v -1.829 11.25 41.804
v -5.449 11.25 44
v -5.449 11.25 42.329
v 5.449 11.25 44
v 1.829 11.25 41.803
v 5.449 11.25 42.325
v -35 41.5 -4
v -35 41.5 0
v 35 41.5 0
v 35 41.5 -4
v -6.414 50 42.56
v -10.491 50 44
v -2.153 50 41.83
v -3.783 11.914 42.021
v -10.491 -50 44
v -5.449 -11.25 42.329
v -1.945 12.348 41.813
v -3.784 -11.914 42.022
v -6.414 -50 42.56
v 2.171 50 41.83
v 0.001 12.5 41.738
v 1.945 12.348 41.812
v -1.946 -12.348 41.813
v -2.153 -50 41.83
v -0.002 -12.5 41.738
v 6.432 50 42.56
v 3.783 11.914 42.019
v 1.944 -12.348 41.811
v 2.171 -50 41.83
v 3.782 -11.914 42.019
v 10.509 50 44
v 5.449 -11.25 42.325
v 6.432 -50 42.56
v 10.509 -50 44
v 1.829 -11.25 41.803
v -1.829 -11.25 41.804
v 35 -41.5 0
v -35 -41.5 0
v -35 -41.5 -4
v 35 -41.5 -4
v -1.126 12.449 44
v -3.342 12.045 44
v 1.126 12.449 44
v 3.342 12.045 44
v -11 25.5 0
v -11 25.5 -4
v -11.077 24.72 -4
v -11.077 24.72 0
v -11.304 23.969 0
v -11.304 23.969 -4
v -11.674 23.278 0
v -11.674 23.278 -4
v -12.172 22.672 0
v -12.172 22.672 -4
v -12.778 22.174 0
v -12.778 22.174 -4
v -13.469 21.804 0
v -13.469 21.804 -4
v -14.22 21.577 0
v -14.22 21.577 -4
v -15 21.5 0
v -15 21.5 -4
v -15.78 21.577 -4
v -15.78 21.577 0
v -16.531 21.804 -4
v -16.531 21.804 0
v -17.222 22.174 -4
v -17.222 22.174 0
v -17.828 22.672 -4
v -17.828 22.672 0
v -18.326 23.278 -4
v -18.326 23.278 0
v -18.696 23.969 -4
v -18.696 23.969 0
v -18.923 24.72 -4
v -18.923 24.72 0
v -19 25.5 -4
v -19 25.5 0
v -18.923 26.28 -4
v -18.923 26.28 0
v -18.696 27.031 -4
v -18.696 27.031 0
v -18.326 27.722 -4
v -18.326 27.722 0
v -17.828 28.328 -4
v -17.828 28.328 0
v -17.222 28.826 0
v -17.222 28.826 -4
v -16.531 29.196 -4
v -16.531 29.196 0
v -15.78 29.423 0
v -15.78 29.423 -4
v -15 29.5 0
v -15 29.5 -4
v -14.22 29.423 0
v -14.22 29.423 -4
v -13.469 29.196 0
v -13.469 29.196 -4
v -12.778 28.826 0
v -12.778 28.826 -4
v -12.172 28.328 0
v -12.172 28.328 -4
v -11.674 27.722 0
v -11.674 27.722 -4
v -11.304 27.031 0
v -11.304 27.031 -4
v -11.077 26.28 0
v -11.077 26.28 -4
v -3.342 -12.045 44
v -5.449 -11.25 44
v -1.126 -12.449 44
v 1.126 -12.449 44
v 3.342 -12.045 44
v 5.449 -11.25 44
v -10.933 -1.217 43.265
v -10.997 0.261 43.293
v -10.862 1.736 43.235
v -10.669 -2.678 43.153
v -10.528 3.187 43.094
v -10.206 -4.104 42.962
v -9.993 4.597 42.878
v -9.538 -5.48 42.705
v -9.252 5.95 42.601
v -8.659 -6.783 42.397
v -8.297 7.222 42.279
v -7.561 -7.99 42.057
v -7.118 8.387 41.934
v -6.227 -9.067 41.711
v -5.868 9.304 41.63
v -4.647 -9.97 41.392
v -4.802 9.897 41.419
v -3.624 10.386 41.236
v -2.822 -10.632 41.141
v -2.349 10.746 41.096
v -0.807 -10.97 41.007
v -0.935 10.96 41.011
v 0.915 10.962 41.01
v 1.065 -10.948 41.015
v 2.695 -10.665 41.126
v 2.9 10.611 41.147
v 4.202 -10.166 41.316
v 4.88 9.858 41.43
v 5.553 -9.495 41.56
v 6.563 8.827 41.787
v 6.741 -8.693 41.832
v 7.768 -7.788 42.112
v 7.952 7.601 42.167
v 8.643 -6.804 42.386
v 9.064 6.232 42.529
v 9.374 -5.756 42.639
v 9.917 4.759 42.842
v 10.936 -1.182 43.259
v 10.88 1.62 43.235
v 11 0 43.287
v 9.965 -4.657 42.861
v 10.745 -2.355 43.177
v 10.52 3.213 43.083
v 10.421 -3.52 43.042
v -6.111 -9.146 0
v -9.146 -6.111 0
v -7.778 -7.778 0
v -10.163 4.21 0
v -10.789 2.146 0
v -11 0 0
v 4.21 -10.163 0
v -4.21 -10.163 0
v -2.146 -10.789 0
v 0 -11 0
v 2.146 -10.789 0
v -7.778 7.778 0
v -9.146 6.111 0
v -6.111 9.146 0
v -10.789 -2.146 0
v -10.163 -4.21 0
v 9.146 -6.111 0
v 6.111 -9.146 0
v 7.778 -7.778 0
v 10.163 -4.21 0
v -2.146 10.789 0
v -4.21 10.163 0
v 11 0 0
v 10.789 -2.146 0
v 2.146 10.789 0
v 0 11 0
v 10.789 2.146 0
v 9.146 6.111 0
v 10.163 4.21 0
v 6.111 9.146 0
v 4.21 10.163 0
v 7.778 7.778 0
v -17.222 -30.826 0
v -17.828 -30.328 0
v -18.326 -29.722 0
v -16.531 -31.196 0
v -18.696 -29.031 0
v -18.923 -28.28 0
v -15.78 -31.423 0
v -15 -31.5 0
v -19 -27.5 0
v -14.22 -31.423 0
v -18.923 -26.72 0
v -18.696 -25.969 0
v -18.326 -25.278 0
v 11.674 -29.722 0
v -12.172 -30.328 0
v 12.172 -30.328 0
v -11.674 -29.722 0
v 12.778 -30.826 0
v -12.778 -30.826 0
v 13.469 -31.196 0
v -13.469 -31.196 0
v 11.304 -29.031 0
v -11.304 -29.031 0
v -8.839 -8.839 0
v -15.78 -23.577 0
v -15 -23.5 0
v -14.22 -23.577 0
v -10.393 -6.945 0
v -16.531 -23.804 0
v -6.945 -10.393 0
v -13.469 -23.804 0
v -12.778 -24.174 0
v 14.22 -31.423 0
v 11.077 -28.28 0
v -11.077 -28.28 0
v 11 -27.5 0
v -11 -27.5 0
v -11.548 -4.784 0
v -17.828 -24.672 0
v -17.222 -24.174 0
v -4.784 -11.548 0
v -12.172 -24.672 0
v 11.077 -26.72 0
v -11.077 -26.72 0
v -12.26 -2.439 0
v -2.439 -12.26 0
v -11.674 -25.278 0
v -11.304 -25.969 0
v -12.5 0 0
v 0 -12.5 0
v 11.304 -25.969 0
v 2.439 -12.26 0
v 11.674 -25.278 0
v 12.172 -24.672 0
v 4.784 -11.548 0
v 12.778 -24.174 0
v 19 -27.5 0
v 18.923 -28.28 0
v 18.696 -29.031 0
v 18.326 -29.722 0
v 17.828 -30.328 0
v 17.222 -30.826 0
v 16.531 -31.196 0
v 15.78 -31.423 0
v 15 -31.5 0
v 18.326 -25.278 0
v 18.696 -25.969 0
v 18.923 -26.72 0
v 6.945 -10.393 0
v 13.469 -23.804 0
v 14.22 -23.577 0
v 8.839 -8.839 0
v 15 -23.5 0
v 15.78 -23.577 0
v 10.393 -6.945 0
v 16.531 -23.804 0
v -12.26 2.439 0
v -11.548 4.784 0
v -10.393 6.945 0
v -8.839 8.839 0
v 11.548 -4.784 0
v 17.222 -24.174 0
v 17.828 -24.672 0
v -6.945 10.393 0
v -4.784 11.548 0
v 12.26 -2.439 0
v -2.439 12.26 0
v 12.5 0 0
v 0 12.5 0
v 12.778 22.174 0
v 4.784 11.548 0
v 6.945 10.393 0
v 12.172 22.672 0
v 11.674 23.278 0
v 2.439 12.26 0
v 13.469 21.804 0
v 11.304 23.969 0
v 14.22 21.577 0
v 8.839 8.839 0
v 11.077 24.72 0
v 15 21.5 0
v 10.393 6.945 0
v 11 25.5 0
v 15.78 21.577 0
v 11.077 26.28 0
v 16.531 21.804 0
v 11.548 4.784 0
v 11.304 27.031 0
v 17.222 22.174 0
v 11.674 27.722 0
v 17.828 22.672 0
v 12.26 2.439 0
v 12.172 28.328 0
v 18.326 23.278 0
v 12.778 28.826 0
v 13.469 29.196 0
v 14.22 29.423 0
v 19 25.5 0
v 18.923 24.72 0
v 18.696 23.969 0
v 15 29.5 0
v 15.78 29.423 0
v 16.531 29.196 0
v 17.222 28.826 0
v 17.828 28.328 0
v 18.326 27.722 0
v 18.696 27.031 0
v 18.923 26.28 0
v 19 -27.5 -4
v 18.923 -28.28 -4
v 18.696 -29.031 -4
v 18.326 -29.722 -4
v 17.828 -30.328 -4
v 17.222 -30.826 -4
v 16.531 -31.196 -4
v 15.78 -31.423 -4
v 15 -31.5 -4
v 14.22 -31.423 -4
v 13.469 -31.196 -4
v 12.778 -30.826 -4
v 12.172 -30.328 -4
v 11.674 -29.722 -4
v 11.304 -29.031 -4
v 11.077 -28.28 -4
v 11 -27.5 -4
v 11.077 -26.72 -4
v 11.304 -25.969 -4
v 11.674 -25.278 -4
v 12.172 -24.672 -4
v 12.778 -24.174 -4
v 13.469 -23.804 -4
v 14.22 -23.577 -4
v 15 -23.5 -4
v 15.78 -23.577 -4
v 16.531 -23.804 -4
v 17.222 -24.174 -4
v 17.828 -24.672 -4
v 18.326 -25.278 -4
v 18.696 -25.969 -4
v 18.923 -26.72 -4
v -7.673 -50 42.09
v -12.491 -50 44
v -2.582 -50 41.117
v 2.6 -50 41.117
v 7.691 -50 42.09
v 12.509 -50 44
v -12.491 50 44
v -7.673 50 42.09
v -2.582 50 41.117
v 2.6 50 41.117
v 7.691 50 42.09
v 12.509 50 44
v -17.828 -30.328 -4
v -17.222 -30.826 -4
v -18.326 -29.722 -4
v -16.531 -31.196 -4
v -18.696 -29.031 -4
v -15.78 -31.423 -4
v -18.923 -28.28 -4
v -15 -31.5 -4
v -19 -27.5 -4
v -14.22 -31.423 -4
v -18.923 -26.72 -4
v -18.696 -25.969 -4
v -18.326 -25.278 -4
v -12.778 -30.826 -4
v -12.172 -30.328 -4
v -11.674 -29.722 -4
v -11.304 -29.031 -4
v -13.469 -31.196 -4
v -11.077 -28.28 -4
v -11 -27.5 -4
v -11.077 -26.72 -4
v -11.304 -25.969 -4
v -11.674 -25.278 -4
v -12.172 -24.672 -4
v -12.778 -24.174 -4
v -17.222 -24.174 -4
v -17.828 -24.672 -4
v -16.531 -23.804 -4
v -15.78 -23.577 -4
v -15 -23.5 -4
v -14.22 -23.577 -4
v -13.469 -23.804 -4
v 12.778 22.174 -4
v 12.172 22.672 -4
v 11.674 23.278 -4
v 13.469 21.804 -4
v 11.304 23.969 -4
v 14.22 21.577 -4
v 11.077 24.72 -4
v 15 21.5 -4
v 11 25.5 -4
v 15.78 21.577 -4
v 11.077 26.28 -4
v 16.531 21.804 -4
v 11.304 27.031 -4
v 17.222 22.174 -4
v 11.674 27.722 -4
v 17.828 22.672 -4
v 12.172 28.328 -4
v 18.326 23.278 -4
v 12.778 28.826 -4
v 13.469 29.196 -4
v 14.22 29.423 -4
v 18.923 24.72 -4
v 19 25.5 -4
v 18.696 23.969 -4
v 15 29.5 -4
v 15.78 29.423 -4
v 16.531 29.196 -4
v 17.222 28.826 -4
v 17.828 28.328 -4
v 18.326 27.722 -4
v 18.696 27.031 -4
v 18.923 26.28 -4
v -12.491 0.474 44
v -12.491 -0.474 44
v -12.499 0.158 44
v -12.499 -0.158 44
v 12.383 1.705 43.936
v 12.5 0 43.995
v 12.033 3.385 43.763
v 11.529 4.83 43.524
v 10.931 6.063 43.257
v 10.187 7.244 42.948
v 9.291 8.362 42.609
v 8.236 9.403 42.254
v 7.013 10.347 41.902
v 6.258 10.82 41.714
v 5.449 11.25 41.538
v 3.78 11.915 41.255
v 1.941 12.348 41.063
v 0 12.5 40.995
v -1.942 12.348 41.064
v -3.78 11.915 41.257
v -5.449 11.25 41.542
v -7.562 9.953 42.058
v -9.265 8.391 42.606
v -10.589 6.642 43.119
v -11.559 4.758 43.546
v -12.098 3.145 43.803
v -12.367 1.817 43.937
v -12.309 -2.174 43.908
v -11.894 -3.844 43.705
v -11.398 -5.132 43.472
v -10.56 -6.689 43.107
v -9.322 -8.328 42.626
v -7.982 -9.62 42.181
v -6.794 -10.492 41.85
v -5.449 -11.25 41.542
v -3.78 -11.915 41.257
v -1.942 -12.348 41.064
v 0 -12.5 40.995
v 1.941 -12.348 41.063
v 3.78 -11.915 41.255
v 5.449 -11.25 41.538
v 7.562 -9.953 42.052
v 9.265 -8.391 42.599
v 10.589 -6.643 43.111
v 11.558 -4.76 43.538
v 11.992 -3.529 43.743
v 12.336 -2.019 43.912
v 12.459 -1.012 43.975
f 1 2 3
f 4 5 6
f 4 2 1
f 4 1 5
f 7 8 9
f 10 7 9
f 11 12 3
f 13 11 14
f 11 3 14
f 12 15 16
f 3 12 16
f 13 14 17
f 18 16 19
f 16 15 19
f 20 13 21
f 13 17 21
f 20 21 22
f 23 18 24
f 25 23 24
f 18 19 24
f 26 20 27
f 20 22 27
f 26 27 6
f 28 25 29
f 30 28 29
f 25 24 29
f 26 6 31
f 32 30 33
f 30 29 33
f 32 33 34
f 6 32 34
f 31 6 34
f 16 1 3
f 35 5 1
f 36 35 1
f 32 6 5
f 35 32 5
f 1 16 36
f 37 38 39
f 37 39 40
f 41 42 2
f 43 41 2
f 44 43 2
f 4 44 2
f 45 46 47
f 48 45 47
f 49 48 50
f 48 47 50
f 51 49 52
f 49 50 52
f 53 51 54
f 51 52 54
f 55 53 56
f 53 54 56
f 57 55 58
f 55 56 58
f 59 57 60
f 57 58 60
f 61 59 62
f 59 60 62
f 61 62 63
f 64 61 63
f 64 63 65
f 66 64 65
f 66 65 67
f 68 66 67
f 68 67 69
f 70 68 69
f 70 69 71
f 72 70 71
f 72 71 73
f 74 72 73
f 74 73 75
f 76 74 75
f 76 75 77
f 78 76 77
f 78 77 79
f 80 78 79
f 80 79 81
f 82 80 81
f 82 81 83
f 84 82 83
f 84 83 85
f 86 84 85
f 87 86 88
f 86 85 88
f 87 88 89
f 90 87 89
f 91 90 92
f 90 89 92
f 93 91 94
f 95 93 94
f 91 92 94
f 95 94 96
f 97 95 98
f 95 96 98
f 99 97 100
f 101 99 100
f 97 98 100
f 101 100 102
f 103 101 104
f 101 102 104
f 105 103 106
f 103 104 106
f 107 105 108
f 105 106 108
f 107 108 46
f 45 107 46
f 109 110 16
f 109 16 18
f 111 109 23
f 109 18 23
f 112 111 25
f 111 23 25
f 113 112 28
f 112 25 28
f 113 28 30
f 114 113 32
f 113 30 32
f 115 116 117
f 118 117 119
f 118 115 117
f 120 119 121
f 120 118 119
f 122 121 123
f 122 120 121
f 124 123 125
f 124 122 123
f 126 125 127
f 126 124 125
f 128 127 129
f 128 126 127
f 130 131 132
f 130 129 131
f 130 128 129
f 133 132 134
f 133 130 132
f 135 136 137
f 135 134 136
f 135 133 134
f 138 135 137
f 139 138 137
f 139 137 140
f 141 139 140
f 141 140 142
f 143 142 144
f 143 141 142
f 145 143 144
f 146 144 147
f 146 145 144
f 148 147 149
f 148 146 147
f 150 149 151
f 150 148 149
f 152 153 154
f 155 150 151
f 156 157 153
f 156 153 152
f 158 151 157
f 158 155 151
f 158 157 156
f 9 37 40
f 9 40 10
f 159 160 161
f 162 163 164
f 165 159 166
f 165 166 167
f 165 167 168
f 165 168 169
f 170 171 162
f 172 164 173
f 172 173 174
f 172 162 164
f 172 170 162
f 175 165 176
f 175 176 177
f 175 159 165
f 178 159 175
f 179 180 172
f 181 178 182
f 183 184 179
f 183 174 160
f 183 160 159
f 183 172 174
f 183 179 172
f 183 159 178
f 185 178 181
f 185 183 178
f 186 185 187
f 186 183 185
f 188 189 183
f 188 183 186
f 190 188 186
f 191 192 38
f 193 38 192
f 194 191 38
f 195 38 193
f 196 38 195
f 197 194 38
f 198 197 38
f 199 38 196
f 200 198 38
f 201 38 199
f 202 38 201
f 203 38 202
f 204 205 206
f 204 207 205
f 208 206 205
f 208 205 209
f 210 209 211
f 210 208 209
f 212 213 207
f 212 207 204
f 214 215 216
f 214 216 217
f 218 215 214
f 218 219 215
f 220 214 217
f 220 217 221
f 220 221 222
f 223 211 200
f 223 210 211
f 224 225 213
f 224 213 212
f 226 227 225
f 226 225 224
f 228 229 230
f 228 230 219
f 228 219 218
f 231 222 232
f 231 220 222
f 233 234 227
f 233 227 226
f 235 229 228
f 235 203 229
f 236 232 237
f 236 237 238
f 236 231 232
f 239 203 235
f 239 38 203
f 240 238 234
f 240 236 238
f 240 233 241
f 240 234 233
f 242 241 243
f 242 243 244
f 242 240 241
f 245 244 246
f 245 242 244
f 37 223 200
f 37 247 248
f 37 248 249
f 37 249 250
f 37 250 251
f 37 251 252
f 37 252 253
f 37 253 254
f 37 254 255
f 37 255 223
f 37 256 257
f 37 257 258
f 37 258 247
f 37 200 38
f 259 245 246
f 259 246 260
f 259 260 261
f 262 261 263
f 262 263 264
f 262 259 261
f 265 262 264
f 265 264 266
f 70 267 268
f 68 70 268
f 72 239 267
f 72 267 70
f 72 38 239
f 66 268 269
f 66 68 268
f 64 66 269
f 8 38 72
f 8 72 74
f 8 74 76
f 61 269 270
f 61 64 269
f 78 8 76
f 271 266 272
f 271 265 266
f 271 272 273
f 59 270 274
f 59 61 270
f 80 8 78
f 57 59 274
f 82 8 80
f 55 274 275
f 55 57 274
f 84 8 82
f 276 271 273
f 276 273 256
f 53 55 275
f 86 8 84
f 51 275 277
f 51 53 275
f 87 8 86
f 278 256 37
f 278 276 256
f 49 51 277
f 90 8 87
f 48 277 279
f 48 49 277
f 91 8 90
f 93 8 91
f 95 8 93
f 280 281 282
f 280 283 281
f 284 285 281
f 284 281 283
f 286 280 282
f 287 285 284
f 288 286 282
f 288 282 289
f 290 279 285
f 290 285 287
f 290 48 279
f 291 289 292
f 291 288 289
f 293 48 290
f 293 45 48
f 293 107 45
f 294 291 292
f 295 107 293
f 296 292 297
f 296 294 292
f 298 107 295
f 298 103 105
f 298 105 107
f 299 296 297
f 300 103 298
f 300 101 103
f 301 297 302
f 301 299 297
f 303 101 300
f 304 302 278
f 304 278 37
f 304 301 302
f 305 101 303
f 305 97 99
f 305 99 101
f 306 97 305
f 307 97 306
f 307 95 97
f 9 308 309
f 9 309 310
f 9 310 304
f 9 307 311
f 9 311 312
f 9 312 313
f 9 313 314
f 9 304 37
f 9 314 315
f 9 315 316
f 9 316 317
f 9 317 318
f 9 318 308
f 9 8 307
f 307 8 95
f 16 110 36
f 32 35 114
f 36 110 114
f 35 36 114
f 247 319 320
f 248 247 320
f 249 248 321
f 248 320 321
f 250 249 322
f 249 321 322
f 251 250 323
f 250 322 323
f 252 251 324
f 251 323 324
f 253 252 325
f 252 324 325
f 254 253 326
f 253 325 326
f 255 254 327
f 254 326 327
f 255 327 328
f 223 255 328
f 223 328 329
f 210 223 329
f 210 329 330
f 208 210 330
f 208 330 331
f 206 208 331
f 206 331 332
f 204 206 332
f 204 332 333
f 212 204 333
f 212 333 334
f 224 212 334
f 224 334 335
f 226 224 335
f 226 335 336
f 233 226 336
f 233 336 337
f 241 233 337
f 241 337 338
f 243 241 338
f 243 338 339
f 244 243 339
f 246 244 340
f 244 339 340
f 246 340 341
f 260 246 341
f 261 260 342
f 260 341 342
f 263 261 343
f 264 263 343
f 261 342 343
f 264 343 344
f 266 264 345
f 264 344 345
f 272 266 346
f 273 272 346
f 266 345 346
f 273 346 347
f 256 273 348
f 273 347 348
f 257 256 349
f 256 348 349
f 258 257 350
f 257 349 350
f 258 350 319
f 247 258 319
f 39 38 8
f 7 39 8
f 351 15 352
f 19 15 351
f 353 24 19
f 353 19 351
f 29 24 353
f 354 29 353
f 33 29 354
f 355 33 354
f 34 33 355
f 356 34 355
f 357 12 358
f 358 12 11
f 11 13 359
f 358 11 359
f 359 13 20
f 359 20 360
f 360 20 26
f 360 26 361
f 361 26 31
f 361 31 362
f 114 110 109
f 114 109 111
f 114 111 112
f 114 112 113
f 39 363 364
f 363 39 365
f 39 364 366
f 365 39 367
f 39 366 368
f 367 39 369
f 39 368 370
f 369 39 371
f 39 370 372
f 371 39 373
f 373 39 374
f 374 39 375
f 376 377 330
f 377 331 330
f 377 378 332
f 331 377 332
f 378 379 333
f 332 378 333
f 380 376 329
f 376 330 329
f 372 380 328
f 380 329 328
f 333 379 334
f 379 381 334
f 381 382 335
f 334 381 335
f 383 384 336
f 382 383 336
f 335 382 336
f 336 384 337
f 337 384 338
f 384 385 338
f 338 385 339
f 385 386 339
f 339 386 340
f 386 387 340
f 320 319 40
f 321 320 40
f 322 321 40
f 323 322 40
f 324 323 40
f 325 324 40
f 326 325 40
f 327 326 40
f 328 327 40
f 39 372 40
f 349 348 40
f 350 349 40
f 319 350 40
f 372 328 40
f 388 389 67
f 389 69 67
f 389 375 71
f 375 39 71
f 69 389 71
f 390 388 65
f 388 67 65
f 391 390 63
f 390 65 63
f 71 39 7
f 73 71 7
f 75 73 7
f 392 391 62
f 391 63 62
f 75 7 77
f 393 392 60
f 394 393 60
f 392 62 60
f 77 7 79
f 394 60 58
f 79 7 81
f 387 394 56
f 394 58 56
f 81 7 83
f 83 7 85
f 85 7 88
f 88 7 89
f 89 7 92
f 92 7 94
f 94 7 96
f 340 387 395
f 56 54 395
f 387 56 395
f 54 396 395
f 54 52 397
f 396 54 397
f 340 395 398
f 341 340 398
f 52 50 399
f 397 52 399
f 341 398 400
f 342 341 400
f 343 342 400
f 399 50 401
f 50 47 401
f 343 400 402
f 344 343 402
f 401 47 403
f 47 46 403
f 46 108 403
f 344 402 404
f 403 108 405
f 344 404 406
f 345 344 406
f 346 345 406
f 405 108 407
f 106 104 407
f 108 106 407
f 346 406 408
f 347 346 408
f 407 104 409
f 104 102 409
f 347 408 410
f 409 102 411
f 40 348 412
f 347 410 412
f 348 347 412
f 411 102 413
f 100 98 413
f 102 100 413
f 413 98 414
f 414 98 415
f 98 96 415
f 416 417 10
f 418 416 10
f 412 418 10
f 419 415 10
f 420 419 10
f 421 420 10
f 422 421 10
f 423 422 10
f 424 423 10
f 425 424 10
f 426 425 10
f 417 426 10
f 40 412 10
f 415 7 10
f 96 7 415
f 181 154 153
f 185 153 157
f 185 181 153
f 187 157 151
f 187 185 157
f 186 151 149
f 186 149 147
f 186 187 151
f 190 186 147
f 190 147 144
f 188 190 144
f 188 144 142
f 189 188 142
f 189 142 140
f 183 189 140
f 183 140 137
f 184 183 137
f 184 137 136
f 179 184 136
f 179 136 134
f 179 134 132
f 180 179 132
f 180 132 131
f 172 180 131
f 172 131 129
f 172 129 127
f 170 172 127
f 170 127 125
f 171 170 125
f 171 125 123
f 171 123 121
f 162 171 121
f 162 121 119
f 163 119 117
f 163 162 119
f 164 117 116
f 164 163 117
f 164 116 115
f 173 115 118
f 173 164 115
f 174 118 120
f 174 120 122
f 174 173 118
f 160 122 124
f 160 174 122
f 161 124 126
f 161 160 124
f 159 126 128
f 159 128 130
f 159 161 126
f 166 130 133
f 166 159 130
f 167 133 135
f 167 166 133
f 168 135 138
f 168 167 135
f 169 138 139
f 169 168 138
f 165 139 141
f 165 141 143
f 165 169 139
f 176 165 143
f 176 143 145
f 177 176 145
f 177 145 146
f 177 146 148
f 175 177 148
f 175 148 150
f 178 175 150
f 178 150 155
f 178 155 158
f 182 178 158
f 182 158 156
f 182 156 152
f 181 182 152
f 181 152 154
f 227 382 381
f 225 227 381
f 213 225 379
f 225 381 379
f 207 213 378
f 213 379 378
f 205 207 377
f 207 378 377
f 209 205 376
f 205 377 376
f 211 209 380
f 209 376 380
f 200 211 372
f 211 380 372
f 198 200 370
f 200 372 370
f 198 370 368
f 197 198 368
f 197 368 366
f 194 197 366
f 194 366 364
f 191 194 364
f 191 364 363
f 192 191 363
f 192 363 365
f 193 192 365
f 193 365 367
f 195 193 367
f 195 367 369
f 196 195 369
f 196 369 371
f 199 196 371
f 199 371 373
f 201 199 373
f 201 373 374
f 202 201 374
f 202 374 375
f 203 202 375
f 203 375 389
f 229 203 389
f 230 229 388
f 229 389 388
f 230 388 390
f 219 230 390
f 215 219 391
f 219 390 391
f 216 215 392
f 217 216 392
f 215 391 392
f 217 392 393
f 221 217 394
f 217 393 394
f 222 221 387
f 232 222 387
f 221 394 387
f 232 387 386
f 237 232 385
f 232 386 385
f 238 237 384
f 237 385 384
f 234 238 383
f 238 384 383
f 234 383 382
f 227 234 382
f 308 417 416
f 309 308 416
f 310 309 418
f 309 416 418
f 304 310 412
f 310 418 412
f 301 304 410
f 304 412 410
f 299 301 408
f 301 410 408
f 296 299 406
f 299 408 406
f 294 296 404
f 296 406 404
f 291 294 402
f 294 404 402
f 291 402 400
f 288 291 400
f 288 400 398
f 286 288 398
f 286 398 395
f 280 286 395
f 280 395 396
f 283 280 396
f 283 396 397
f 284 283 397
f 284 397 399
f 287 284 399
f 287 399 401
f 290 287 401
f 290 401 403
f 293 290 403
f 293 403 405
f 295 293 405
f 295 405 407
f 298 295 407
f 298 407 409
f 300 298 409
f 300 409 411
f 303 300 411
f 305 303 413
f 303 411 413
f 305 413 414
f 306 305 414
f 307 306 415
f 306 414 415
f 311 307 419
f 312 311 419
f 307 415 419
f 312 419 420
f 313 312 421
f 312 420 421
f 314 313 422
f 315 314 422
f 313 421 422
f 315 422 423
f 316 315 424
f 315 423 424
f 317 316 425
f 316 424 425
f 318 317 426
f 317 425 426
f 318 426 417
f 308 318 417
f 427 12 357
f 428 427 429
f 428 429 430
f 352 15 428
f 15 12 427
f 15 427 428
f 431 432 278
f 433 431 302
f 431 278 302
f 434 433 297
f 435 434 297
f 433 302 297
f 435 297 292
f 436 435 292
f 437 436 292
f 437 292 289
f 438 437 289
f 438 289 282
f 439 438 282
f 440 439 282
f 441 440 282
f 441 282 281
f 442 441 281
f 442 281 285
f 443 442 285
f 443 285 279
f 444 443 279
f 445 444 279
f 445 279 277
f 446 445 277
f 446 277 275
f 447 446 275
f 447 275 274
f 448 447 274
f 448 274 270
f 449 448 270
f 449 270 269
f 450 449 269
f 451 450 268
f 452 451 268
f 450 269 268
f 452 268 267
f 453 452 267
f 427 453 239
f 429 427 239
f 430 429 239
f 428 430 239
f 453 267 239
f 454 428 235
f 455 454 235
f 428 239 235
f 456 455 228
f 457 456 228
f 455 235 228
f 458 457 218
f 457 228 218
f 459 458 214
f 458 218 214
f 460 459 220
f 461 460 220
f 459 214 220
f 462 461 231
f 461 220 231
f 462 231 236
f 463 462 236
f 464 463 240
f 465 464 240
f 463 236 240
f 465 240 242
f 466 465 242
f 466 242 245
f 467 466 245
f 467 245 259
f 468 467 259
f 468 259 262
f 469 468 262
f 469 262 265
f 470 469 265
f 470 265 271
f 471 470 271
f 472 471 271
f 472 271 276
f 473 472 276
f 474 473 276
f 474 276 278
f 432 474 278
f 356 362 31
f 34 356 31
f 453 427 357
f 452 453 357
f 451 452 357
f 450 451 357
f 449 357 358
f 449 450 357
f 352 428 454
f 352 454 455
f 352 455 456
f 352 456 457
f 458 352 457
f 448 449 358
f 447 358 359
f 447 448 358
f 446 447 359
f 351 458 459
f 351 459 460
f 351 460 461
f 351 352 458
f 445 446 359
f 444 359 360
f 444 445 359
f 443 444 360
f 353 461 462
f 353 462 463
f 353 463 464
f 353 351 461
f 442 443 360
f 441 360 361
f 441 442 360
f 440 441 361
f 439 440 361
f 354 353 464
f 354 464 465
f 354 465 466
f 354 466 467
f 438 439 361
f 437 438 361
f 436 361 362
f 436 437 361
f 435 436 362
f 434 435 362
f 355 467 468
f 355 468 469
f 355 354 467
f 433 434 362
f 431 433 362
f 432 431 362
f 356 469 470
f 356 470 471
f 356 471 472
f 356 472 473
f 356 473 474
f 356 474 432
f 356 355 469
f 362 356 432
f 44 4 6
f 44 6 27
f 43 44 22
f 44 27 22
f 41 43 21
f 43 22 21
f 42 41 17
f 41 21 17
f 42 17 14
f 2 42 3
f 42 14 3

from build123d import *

# Parameters (mm, degrees)
F0_W     = 70
F0_H     = 83
F1_DEPTH = 4
F2_R     = 12.5
F2_R_2   = 11
F3_DEPTH = 44
F5_DEPTH = 11.25
F6_R     = 4
F7_DEPTH = 25


with BuildPart() as f1:
    # F0 (on Top) → F1 (new body)
    with BuildSketch(Plane.XY):
        Rectangle(F0_W, F0_H)
    extrude(amount=-F1_DEPTH)

    # F2 (on face) → F3 (join)
    with BuildSketch(Plane.XY):
        Circle(F2_R)
        Circle(F2_R_2, mode=Mode.SUBTRACT)
    extrude(amount=F3_DEPTH)

    # F4 (on Front) → F5 (cut, symmetric)
    with BuildSketch(Plane.XZ):
        with BuildLine():
            Line((10.5089721754, 44), (-10.4910278246, 44))
            ThreePointArc((-10.4910278246, 44), (0.0089721754, 41.7379000772), (10.5089721754, 44))
        make_face()
        with BuildLine():
            Line((-10.4910278246, 44), (-12.4910278246, 44))
            ThreePointArc((-12.4910278246, 44), (0.0089721754, 40.9948974278), (12.5089721754, 44))
            Line((12.5089721754, 44), (10.5089721754, 44))
            ThreePointArc((10.5089721754, 44), (0.0089721754, 41.7379000772), (-10.4910278246, 44))
        make_face()
    extrude(amount=F5_DEPTH, both=True, mode=Mode.SUBTRACT)

    # F6 (on face) → F7 (cut)
    with BuildSketch(Plane(origin=(0, 0, -4), x_dir=(1, 0, 0), z_dir=(0, 0, -1))):
        with Locations((-15, 27.5)):
            Circle(F6_R)
        with Locations((15, 27.5)):
            Circle(F6_R)
        with Locations((15, -25.5)):
            Circle(F6_R)
        with Locations((-15, -25.5)):
            Circle(F6_R)
    extrude(amount=-F7_DEPTH, mode=Mode.SUBTRACT)

    # F9: sweep along a path in F8
    with BuildLine(Plane.YZ) as f9_path:
        Line((50, 37), (-50, 37))
    # F4 (on Front) → F9 (sweep)
    with BuildSketch(Plane.XZ):
        with BuildLine():
            Line((-10.4910278246, 44), (-12.4910278246, 44))
            ThreePointArc((-12.4910278246, 44), (0.0089721754, 40.9948974278), (12.5089721754, 44))
            Line((12.5089721754, 44), (10.5089721754, 44))
            ThreePointArc((10.5089721754, 44), (0.0089721754, 41.7379000772), (-10.4910278246, 44))
        make_face()
    sweep(path=f9_path.line)


solid = f1.part
